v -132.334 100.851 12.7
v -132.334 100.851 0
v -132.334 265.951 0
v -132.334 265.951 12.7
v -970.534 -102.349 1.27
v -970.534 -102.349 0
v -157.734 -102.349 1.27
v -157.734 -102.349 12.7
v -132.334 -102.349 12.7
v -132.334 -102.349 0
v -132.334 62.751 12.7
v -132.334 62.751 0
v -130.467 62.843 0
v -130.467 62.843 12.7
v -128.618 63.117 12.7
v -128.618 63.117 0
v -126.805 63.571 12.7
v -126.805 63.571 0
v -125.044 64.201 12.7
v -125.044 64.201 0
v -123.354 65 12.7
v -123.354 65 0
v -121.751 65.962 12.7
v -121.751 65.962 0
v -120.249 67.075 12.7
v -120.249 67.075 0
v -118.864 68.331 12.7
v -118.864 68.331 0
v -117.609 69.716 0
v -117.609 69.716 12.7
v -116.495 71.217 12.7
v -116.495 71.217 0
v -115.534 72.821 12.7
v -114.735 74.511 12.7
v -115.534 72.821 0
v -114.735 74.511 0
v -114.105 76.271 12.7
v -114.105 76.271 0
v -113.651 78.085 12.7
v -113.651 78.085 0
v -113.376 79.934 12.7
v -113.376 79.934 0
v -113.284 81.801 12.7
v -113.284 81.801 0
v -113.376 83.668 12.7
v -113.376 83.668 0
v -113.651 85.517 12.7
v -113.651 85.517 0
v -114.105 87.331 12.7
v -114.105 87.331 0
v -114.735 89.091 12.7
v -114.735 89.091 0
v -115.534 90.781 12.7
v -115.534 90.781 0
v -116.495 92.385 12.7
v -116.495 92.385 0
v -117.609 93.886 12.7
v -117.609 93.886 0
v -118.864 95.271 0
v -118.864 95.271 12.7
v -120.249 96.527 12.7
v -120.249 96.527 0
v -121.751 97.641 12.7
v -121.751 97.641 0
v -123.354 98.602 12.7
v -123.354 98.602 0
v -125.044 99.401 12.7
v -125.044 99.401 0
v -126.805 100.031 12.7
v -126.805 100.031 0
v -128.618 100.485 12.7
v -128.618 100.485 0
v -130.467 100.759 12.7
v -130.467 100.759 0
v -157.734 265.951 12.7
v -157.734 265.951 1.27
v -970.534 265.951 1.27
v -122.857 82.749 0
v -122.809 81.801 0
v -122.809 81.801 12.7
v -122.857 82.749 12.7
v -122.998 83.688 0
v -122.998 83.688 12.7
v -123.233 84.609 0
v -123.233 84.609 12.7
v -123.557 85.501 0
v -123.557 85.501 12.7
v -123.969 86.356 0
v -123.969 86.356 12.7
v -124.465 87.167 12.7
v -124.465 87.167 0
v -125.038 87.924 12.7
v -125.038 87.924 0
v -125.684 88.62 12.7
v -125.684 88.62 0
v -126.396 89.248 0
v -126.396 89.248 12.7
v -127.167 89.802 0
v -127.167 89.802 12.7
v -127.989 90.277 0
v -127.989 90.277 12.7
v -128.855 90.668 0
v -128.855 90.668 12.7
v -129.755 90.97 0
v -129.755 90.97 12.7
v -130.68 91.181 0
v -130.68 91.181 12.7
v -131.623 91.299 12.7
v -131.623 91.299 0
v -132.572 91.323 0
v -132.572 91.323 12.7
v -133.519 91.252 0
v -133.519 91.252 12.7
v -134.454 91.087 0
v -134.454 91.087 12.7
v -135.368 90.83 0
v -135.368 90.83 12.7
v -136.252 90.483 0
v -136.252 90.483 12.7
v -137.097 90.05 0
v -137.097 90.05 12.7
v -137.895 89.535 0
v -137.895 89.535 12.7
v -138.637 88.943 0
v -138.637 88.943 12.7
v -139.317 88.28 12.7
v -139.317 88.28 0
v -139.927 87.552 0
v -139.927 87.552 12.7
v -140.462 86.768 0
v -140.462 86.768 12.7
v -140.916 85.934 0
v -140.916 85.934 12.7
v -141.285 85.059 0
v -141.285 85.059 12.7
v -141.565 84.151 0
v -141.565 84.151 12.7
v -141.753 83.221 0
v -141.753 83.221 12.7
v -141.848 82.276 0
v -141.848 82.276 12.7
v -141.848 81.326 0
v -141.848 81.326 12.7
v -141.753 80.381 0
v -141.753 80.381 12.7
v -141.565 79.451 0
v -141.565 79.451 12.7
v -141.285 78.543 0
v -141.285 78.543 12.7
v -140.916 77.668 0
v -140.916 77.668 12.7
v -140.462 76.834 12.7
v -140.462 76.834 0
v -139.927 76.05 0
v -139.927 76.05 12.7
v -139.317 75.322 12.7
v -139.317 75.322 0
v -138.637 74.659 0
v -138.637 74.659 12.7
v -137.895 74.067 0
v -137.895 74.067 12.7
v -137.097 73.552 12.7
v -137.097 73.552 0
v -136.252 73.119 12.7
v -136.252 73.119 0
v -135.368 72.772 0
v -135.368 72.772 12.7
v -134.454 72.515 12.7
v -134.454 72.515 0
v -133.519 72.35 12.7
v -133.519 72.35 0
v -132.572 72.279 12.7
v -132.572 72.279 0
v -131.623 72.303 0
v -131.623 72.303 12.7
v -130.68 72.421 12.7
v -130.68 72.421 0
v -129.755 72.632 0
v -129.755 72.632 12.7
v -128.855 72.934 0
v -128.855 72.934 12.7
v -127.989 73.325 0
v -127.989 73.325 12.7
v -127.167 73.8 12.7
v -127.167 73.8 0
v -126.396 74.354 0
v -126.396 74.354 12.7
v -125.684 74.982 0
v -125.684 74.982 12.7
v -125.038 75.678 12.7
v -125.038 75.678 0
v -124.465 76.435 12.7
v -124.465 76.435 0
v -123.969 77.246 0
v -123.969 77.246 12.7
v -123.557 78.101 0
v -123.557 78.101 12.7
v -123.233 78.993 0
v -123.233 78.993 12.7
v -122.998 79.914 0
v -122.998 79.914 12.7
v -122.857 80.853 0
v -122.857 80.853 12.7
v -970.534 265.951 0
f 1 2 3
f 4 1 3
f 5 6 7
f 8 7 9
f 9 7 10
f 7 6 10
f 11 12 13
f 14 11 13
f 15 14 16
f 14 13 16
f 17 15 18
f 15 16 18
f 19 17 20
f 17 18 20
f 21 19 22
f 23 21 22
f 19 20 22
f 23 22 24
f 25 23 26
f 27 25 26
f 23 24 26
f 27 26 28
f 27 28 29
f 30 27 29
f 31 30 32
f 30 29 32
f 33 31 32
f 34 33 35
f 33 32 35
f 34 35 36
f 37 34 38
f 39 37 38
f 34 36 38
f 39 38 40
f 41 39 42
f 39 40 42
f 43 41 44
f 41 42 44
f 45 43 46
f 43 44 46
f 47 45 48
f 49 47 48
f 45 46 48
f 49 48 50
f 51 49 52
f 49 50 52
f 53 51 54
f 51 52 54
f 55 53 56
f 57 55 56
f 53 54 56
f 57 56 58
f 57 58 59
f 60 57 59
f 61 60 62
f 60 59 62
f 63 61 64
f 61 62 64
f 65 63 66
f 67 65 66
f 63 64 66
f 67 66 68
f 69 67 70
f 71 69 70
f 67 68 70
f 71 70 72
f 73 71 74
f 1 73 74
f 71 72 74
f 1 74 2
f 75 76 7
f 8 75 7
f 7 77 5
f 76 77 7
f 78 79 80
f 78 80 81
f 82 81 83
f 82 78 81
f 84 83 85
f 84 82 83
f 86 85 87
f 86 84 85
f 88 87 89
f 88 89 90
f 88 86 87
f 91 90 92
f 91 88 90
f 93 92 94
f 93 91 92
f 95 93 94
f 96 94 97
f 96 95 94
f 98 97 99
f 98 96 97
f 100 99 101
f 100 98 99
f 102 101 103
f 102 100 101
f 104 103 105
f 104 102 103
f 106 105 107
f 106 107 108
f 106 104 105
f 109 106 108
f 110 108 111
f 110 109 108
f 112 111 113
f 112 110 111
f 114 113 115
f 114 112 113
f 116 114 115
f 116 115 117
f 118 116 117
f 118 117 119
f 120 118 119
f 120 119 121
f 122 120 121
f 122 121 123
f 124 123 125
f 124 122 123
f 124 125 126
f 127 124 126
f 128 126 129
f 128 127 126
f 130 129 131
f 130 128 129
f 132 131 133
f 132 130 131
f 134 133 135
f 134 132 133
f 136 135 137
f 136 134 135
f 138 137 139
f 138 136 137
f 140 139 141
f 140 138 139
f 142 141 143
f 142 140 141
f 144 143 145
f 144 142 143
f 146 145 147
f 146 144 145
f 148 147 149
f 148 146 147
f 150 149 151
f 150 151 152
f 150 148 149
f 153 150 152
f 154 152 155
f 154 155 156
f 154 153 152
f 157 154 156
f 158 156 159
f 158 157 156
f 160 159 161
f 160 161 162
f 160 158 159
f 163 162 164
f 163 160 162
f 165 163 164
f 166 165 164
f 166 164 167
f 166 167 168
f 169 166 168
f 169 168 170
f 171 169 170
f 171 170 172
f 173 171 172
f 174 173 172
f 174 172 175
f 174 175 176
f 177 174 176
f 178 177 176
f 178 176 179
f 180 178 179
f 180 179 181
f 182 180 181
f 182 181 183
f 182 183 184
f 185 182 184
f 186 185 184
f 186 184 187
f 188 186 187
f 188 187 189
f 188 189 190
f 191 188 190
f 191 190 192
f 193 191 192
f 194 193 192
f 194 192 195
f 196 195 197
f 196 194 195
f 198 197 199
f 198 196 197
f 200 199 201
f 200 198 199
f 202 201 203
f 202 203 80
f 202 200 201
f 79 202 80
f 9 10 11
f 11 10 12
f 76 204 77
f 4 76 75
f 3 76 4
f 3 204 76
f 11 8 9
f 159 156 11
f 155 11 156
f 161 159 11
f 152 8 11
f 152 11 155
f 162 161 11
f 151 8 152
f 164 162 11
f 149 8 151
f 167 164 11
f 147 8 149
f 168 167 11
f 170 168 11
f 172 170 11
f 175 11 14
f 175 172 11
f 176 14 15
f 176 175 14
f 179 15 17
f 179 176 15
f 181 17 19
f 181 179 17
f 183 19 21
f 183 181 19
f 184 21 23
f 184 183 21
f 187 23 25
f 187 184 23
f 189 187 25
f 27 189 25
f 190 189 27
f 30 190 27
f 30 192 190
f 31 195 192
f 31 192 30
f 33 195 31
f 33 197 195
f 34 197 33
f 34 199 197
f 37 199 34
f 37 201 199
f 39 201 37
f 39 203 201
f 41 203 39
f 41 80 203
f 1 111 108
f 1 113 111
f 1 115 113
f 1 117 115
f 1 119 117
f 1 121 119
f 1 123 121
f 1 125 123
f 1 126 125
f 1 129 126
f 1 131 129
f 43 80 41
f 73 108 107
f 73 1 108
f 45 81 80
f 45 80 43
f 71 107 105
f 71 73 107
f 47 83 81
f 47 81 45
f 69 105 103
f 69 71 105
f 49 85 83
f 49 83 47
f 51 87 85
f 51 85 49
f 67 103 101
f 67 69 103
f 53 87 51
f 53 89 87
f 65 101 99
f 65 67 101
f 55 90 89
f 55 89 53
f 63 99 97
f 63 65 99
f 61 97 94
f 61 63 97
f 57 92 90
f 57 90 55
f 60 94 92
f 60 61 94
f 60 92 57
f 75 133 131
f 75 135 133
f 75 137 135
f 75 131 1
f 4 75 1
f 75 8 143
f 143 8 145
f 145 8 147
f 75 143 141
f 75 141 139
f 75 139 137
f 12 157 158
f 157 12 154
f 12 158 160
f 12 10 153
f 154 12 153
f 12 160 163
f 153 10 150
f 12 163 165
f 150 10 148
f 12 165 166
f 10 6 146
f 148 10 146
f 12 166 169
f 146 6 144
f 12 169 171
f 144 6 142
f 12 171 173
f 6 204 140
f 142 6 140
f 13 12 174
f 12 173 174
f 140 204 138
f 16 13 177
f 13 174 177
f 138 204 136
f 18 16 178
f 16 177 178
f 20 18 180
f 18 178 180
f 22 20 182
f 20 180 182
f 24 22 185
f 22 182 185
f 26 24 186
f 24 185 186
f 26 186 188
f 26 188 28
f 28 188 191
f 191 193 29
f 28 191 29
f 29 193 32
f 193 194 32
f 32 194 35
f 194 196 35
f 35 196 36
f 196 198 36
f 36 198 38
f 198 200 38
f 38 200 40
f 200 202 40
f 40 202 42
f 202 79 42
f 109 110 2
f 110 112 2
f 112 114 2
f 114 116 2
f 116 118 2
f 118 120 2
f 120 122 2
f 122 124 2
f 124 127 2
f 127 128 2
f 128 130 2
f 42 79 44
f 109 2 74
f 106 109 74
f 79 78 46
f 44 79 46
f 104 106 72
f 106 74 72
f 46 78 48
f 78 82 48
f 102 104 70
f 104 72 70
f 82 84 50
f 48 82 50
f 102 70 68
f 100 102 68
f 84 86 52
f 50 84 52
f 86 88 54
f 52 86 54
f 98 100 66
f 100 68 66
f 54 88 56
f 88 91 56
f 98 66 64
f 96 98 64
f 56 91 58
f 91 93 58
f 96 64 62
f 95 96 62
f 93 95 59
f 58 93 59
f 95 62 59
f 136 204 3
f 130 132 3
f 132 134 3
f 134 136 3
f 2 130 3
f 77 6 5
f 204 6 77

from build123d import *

# Parameters (mm, degrees)
F0_R     = 9.525
F1_DEPTH = 12.7
F2_W     = 812.8
F2_H     = 368.3
F3_DEPTH = 1.27


with BuildPart() as f1:
    # F0 (on Top) → F1 (new body)
    with BuildSketch(Plane.XY):
        with BuildLine():
            Line((-157.734471, -102.348973), (-132.334471, -102.348973))
            Line((-132.334471, -102.348973), (-132.334471, 62.751027))
            ThreePointArc((-132.334471, 62.751027), (-113.284471, 81.801027), (-132.334471, 100.851027))
            Line((-132.334471, 100.851027), (-132.334471, 265.951027))
            Line((-132.334471, 265.951027), (-157.734471, 265.951027))
            Line((-157.734471, 265.951027), (-157.734471, -102.348973))
        make_face()
        with Locations((-132.334471, 81.801027)):
            Circle(F0_R, mode=Mode.SUBTRACT)
    extrude(amount=F1_DEPTH)

    # F2 (on Top) → F3 (join)
    with BuildSketch(Plane.XY):
        with Locations((-564.134471, 81.801027)):
            Rectangle(F2_W, F2_H)
    extrude(amount=F3_DEPTH)


solid = f1.part
